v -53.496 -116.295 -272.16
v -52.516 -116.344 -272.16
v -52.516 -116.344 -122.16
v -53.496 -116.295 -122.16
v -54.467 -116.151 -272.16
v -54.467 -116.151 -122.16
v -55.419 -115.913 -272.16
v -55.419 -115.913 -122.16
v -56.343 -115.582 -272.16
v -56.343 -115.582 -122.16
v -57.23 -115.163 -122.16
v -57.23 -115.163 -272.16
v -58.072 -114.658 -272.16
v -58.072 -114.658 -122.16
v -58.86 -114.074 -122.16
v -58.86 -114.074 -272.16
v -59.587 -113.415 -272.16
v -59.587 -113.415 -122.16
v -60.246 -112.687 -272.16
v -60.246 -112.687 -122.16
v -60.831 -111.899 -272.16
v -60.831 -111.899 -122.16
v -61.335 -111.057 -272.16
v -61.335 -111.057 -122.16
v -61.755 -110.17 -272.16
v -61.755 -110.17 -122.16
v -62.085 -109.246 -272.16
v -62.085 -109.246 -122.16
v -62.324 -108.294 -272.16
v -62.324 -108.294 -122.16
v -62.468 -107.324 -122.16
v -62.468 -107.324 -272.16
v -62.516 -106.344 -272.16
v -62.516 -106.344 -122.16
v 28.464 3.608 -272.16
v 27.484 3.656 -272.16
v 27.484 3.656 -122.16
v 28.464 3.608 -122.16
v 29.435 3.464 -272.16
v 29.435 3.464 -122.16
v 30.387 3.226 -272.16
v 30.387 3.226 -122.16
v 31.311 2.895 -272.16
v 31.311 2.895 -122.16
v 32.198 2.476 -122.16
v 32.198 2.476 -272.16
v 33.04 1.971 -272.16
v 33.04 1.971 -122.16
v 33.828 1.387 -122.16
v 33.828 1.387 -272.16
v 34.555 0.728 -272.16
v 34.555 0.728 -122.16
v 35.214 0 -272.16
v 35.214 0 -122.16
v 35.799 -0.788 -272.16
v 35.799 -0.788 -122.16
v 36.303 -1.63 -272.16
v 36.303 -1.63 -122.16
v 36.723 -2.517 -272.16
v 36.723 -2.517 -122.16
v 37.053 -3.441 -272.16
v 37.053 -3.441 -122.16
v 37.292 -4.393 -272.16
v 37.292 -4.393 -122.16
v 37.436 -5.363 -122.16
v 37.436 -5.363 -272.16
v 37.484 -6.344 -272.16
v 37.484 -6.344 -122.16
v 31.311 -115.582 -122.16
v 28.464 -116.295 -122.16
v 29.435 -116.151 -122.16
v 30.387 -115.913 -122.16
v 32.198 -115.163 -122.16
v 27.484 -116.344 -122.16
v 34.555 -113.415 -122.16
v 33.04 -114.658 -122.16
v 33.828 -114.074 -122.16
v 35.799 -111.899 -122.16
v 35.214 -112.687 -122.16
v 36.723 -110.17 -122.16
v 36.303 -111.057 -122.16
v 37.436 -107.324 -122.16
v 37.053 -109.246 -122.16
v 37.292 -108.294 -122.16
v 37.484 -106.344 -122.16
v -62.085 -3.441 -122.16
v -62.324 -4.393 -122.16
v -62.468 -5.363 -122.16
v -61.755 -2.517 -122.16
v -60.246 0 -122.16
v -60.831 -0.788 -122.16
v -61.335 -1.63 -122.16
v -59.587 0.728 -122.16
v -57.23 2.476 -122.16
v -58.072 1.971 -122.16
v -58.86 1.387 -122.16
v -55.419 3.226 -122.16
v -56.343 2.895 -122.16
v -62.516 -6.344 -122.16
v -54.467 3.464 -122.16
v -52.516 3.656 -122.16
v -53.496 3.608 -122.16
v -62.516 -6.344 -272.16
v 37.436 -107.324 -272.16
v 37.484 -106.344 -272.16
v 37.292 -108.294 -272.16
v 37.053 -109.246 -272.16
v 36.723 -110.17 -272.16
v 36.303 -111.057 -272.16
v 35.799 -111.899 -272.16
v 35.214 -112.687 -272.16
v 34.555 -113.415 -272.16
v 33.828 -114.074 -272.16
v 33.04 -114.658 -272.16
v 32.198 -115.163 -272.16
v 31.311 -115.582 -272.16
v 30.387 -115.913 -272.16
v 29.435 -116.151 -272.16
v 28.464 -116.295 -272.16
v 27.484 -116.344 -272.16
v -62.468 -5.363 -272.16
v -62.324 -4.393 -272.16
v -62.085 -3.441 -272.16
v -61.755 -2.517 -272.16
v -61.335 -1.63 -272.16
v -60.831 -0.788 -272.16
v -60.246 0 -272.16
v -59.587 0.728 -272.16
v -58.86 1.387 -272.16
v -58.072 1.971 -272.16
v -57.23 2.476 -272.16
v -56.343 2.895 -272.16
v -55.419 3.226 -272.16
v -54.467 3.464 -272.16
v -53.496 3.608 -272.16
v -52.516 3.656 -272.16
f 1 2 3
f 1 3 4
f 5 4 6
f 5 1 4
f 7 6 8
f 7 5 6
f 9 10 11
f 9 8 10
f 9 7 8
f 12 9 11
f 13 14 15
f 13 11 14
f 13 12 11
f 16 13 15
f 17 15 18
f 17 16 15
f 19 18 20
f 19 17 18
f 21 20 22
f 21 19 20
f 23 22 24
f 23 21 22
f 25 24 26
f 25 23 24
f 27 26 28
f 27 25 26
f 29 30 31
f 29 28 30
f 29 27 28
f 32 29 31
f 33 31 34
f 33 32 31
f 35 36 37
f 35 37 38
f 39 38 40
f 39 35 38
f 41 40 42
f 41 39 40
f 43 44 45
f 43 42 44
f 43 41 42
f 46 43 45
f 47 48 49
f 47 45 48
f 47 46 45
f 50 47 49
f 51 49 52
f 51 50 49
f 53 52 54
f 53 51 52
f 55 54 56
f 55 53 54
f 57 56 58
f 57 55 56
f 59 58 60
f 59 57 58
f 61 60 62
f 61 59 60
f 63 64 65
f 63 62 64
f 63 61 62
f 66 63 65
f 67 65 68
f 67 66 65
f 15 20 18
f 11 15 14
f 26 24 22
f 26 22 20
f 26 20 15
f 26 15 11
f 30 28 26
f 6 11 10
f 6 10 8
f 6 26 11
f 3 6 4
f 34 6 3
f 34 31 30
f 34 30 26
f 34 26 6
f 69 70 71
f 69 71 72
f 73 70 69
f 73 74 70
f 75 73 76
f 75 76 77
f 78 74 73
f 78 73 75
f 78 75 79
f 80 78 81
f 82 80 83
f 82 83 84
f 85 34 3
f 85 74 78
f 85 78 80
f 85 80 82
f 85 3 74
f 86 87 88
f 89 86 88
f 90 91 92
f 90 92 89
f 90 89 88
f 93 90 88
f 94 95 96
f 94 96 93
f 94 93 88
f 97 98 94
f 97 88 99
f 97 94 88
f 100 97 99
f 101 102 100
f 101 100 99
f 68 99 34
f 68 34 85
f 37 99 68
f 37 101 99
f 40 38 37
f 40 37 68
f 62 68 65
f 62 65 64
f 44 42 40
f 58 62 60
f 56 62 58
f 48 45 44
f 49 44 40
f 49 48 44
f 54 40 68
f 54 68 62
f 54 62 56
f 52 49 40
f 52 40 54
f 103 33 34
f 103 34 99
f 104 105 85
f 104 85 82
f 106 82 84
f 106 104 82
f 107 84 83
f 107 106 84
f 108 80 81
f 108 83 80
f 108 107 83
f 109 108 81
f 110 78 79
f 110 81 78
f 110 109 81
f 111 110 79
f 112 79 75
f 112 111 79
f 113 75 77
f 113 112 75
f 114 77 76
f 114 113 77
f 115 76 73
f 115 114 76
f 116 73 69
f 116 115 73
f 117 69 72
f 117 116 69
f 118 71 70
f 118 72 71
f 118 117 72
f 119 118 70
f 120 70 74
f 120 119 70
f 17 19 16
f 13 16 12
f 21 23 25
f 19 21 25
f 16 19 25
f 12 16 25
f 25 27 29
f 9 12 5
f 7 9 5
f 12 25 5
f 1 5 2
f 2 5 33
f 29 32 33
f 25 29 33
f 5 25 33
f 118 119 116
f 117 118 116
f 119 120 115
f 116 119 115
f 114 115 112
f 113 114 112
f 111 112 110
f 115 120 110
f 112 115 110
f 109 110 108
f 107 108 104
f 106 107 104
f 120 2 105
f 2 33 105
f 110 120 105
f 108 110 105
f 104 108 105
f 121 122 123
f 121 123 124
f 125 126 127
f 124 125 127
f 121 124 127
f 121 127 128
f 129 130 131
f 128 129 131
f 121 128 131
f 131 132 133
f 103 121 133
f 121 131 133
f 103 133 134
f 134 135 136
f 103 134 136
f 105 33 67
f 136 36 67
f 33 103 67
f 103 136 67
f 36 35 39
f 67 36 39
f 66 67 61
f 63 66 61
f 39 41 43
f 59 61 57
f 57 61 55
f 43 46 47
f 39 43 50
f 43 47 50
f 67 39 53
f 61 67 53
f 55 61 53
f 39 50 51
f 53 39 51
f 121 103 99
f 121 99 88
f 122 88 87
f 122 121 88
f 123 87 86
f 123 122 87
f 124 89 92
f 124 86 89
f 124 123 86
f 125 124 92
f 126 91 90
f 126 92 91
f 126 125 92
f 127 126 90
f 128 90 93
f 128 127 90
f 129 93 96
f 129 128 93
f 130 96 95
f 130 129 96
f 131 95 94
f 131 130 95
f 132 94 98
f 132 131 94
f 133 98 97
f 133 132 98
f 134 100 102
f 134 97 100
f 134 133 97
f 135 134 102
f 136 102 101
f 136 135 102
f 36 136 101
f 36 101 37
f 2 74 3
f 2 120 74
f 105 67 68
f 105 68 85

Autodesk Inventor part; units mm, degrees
ref_plane "YZ Plane" through (0, 0, 0) normal (1, 0, 0) x (0, 1, 0)
ref_plane "XZ Plane" through (0, 0, 0) normal (0, 1, 0) x (-1, 0, 0)
ref_plane "XY Plane" through (0, 0, 0) normal (0, 0, 1) x (1, 0, 0)
ref_plane "Work Plane1" through (-100.016, -421.3435, -272.1596) normal (0, 0, 1) x (1, 0, 0)
sketch "Sketch1" plane through (-100.016, -421.3435, -272.1596) normal (0, 0, 1) x (1, 0, 0)
  line L0 (47.5, 425) -> (127.5, 425)
  line L1 (137.5, 415) -> (137.5, 315)
  line L2 (127.5, 305) -> (47.5, 305)
  line L3 (37.5, 315) -> (37.5, 415)
  line L4 (37.5, 425) -> (137.5, 305) construction
  line L5 (137.5, 425) -> (37.5, 305) construction
  arc A0 (47.5, 425) -> (37.5, 415) centre (47.5, 415) ccw
  arc A1 (137.5, 415) -> (127.5, 425) centre (127.5, 415) ccw
  arc A2 (127.5, 305) -> (137.5, 315) centre (127.5, 315) ccw
  arc A3 (37.5, 315) -> (47.5, 305) centre (47.5, 315) ccw
  line L6 (190, 0) -> (190, 500) projected
  line L7 (-15, 0) -> (-15, 500) projected
  line L8 (62.5, 0) -> (-85.7051, 0) projected
  line L9 (260.7051, 0) -> (112.5, 0) projected
  line L10 (62.5, 0) -> (112.5, 0) projected
  point P0 (100.016, 421.3435)
  point P1 (87.5, 365)
  dimension "d0" = 100
  dimension "d1" = 120
  dimension "d2" = 10
  dimension "d3" = 52.5
  dimension "d4" = 305
extrude "Extrusion1" add sketch "Sketch1" along normal blind 150
properties part number "cantiliever" material "Steel, Cast"
